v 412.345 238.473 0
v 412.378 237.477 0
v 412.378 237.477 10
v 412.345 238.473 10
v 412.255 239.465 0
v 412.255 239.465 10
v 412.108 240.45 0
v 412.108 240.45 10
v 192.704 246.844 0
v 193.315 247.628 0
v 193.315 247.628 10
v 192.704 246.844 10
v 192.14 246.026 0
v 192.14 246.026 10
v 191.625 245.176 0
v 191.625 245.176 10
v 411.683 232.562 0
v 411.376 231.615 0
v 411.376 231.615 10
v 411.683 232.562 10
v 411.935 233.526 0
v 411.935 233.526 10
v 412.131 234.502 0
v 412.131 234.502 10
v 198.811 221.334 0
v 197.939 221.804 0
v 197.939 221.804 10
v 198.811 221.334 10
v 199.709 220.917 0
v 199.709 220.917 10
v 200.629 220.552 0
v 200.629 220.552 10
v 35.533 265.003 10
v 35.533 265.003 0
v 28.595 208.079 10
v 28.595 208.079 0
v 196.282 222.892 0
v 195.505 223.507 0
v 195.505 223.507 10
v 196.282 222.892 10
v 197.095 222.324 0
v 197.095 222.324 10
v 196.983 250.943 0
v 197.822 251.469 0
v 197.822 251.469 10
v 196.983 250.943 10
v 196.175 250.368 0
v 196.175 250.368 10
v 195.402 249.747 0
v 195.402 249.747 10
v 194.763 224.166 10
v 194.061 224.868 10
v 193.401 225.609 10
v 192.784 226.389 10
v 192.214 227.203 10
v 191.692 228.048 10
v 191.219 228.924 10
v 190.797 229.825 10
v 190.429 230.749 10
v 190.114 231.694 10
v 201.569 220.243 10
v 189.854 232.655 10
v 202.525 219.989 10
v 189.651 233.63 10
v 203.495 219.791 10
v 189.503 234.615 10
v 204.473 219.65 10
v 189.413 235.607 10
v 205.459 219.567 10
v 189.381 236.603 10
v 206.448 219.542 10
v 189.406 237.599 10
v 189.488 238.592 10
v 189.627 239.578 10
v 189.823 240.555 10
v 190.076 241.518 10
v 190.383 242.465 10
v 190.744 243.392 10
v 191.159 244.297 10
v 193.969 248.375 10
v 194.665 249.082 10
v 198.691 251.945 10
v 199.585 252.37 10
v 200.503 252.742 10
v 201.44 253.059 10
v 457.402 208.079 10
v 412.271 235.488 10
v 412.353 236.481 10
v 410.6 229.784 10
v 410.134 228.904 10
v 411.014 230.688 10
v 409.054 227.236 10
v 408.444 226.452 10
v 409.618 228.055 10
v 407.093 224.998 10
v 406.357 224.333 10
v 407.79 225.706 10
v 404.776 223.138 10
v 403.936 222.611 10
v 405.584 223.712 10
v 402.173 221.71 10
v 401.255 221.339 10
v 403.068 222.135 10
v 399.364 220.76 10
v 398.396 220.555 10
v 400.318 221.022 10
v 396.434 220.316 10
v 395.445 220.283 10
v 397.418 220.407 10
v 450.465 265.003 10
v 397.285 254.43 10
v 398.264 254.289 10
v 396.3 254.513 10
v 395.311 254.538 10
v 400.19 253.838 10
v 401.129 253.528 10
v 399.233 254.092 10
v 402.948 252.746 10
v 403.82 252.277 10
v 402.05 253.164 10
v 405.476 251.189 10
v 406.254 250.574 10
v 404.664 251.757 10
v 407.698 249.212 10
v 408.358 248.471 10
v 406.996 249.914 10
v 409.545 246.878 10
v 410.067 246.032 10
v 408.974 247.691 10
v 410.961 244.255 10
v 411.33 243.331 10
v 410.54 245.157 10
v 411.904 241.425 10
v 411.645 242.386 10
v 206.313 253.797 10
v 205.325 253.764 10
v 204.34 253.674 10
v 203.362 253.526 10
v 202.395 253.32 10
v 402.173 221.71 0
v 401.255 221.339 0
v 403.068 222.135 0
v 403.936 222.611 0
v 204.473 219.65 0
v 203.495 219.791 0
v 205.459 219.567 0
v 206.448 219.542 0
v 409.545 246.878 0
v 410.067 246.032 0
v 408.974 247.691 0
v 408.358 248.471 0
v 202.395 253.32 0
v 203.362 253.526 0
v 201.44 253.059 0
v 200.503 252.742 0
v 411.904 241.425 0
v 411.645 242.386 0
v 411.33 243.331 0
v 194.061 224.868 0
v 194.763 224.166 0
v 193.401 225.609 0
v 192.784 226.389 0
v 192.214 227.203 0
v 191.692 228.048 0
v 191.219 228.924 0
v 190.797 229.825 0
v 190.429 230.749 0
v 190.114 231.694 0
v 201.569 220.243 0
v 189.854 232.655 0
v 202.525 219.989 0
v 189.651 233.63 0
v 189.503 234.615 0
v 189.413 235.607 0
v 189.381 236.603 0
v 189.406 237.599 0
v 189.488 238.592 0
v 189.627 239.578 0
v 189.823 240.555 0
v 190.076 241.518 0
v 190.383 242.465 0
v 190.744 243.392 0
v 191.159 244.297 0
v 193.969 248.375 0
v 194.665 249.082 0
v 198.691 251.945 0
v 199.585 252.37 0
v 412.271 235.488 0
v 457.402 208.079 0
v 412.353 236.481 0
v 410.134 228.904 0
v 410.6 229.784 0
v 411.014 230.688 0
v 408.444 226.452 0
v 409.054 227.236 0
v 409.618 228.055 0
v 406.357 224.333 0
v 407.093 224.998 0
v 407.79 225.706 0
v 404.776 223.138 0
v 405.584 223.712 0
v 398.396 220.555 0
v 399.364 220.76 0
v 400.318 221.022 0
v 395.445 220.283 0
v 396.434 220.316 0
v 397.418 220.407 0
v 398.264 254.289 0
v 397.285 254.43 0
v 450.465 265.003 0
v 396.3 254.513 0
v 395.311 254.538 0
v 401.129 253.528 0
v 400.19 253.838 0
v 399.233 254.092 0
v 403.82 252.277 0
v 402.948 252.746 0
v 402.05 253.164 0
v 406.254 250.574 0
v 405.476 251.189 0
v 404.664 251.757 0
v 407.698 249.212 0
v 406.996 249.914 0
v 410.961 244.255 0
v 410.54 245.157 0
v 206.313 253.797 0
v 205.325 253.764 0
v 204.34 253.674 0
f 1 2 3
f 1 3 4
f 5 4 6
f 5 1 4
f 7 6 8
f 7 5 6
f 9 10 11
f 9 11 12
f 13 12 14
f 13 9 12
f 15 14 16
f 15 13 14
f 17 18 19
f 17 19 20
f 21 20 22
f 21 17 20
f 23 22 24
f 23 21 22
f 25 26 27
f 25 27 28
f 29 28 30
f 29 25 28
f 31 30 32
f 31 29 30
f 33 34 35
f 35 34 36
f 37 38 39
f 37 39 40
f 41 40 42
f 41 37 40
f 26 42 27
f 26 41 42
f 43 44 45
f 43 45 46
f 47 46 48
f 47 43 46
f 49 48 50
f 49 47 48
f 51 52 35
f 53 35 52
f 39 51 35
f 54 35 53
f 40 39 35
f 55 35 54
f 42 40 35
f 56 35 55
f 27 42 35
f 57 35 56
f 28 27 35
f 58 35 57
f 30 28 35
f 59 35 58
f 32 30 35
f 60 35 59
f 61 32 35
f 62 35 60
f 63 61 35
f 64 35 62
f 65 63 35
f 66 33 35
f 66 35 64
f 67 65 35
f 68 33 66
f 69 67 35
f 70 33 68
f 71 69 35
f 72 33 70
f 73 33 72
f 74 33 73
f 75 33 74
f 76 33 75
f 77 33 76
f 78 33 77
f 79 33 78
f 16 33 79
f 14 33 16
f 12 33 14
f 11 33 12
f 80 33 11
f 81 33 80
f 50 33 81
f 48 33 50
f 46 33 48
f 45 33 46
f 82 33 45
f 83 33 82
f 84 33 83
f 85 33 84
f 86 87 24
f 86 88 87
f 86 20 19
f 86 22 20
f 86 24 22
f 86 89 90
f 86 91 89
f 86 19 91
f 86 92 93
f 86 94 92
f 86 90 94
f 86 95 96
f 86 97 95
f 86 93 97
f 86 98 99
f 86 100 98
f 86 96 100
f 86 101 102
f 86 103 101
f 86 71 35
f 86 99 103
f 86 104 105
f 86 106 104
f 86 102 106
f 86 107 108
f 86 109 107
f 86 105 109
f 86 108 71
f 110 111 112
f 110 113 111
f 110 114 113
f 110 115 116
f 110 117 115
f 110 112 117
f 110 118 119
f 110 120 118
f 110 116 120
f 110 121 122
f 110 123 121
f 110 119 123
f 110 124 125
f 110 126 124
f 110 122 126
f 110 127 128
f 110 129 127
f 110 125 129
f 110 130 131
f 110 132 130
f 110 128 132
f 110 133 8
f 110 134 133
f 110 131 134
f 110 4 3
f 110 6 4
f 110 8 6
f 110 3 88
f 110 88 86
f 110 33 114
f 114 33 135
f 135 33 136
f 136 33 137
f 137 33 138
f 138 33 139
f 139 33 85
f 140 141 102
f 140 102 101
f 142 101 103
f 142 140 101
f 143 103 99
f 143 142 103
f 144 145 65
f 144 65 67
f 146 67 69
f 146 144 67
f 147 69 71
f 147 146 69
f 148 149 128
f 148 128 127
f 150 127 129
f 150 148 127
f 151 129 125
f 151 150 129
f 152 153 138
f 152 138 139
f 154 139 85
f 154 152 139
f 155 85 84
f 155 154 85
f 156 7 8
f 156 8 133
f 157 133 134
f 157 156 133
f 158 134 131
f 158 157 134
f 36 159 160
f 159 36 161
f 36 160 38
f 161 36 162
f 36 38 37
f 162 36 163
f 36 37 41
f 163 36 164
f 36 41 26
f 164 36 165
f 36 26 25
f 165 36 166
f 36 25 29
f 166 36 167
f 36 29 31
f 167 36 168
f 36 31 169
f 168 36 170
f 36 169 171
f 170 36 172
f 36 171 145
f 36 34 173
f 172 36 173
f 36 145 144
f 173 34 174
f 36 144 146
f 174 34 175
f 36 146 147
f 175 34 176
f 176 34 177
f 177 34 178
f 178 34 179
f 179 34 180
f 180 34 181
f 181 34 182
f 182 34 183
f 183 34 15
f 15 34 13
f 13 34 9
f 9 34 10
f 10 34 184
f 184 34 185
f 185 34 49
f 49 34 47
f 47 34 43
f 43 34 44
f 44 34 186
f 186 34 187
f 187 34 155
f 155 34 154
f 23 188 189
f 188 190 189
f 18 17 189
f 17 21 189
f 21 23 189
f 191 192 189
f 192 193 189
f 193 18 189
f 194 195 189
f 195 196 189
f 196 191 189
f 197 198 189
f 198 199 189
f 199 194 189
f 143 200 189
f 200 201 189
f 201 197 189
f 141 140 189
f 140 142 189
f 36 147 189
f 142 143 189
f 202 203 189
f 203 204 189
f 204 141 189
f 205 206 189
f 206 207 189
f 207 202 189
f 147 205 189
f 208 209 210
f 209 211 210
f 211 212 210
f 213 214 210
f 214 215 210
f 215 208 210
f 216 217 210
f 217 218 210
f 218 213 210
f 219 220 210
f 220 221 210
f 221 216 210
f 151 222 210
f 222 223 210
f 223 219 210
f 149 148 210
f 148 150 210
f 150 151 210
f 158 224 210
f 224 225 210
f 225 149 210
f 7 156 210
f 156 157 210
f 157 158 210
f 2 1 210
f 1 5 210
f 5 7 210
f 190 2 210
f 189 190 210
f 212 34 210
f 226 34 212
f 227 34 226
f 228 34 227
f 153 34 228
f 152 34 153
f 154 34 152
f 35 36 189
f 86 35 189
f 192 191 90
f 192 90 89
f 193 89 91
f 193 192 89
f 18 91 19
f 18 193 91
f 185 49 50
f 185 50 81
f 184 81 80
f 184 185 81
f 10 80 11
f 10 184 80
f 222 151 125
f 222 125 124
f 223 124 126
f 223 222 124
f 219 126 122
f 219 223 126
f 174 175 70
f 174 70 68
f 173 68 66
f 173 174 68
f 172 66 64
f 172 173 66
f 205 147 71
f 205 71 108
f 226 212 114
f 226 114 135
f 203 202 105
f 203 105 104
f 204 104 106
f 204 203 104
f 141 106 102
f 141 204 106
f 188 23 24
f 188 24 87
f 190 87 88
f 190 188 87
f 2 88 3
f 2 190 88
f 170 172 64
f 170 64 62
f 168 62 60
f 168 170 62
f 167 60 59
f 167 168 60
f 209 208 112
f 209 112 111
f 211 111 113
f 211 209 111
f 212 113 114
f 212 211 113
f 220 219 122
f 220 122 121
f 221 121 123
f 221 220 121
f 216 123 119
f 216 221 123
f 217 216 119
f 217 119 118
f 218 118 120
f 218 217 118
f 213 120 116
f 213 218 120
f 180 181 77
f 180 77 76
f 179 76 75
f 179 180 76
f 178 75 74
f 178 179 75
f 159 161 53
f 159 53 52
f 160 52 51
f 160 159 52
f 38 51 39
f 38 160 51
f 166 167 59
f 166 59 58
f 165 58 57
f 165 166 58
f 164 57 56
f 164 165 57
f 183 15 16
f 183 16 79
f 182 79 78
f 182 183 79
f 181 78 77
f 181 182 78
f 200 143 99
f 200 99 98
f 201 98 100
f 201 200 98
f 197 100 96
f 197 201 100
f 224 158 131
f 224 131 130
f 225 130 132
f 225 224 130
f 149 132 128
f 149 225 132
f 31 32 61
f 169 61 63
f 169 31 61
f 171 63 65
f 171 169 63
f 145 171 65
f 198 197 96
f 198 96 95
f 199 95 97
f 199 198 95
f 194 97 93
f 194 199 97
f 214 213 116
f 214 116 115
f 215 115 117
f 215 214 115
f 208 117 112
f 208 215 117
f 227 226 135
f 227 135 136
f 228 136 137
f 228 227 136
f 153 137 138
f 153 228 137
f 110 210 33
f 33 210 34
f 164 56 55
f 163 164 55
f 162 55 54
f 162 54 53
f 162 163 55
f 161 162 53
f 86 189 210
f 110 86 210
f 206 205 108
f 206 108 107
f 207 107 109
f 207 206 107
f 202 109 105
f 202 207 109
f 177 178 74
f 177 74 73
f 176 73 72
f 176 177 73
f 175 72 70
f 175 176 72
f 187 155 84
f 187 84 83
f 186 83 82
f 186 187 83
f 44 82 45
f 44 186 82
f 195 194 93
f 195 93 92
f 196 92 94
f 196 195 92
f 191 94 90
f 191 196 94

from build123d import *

# Parameters (mm, degrees)
BOSS_EXTRUDE1_DEPTH = 10


with BuildPart() as part:
    # Model → Boss-Extrude1 (new body)
    with BuildSketch(Plane.XY):
        Polygon((28.595430627, 208.079406788), (457.402364394, 208.079406788), (450.465147668, 265.002801404), (35.532647353, 265.002801404), align=None)
        with BuildLine():
            Line((395.310996933, 254.538077216), (206.313334547, 253.79734179))
            ThreePointArc((206.313334547, 253.79734179), (204.831877168, 253.726342411), (203.362371854, 253.525566384))
            ThreePointArc((203.362371854, 253.525566384), (201.915523421, 253.196404178), (200.503112299, 252.741637237))
            ThreePointArc((200.503112299, 252.741637237), (199.134879559, 252.164276657), (197.822433038, 251.469373641))
            ThreePointArc((197.822433038, 251.469373641), (196.574446388, 250.661348154), (195.401785154, 249.747432679))
            ThreePointArc((195.401785154, 249.747432679), (194.312018164, 248.73331433), (193.314718807, 247.628134658))
            ThreePointArc((193.314718807, 247.628134658), (192.416254629, 246.43882667), (191.624648452, 245.175873375))
            ThreePointArc((191.624648452, 245.175873375), (190.944865739, 243.847507192), (190.382926022, 242.465159548))
            ThreePointArc((190.382926022, 242.465159548), (189.942468925, 241.038153288), (189.627280625, 239.578356845))
            ThreePointArc((189.627280625, 239.578356845), (189.439494965, 238.096112854), (189.380672163, 236.603179306))
            ThreePointArc((189.380672163, 236.603179306), (189.451209877, 235.110754019), (189.65059371, 233.630026194))
            ThreePointArc((189.65059371, 233.630026194), (189.977255318, 232.172756129), (190.428843836, 230.749235263))
            ThreePointArc((190.428843836, 230.749235263), (191.001660076, 229.37136212), (191.691775805, 228.048337887))
            ThreePointArc((191.691775805, 228.048337887), (192.493322165, 226.791673876), (193.401016068, 225.609399465))
            ThreePointArc((193.401016068, 225.609399465), (194.406947639, 224.512071023), (195.504630226, 223.506525909))
            ThreePointArc((195.504630226, 223.506525909), (196.684373261, 222.601764862), (197.938701025, 221.803611967))
            ThreePointArc((197.938701025, 221.803611967), (199.256526594, 221.11895856), (200.629270456, 220.552399817))
            ThreePointArc((200.629270456, 220.552399817), (202.045191851, 220.108676612), (203.494586929, 219.790906907))
            ThreePointArc((203.494586929, 219.790906907), (204.965619617, 219.601640863), (206.447589253, 219.542270814))
            Line((206.447589253, 219.542270814), (395.445251639, 220.28300624))
            ThreePointArc((395.445251639, 220.28300624), (396.926709019, 220.354005619), (398.396214333, 220.554781645))
            ThreePointArc((398.396214333, 220.554781645), (399.843062766, 220.883943851), (401.255473887, 221.338710792))
            ThreePointArc((401.255473887, 221.338710792), (402.623706627, 221.916071373), (403.936153148, 222.610974389))
            ThreePointArc((403.936153148, 222.610974389), (405.184139798, 223.418999875), (406.356801033, 224.33291535))
            ThreePointArc((406.356801033, 224.33291535), (407.446568022, 225.347033699), (408.44386738, 226.452213372))
            ThreePointArc((408.44386738, 226.452213372), (409.342331557, 227.641521359), (410.133937735, 228.904474655))
            ThreePointArc((410.133937735, 228.904474655), (410.813720448, 230.232840838), (411.375660165, 231.615188482))
            ThreePointArc((411.375660165, 231.615188482), (411.816117262, 233.042194741), (412.131305562, 234.501991184))
            ThreePointArc((412.131305562, 234.501991184), (412.319091222, 235.984235175), (412.377914024, 237.477168724))
            ThreePointArc((412.377914024, 237.477168724), (412.30737631, 238.96959401), (412.107992477, 240.450321835))
            ThreePointArc((412.107992477, 240.450321835), (411.781330869, 241.9075919), (411.329742351, 243.331112767))
            ThreePointArc((411.329742351, 243.331112767), (410.756926111, 244.708985909), (410.066810382, 246.032010143))
            ThreePointArc((410.066810382, 246.032010143), (409.265264021, 247.288674153), (408.357570118, 248.470948564))
            ThreePointArc((408.357570118, 248.470948564), (407.351638547, 249.568277006), (406.253955961, 250.57382212))
            ThreePointArc((406.253955961, 250.57382212), (405.074212926, 251.478583167), (403.819885162, 252.276736063))
            ThreePointArc((403.819885162, 252.276736063), (402.502059592, 252.961389469), (401.129315731, 253.527948213))
            ThreePointArc((401.129315731, 253.527948213), (399.713394336, 253.971671417), (398.263999257, 254.289441123))
            ThreePointArc((398.263999257, 254.289441123), (396.792966569, 254.478707167), (395.310996933, 254.538077216))
        make_face(mode=Mode.SUBTRACT)
    extrude(amount=BOSS_EXTRUDE1_DEPTH)


solid = part.part
